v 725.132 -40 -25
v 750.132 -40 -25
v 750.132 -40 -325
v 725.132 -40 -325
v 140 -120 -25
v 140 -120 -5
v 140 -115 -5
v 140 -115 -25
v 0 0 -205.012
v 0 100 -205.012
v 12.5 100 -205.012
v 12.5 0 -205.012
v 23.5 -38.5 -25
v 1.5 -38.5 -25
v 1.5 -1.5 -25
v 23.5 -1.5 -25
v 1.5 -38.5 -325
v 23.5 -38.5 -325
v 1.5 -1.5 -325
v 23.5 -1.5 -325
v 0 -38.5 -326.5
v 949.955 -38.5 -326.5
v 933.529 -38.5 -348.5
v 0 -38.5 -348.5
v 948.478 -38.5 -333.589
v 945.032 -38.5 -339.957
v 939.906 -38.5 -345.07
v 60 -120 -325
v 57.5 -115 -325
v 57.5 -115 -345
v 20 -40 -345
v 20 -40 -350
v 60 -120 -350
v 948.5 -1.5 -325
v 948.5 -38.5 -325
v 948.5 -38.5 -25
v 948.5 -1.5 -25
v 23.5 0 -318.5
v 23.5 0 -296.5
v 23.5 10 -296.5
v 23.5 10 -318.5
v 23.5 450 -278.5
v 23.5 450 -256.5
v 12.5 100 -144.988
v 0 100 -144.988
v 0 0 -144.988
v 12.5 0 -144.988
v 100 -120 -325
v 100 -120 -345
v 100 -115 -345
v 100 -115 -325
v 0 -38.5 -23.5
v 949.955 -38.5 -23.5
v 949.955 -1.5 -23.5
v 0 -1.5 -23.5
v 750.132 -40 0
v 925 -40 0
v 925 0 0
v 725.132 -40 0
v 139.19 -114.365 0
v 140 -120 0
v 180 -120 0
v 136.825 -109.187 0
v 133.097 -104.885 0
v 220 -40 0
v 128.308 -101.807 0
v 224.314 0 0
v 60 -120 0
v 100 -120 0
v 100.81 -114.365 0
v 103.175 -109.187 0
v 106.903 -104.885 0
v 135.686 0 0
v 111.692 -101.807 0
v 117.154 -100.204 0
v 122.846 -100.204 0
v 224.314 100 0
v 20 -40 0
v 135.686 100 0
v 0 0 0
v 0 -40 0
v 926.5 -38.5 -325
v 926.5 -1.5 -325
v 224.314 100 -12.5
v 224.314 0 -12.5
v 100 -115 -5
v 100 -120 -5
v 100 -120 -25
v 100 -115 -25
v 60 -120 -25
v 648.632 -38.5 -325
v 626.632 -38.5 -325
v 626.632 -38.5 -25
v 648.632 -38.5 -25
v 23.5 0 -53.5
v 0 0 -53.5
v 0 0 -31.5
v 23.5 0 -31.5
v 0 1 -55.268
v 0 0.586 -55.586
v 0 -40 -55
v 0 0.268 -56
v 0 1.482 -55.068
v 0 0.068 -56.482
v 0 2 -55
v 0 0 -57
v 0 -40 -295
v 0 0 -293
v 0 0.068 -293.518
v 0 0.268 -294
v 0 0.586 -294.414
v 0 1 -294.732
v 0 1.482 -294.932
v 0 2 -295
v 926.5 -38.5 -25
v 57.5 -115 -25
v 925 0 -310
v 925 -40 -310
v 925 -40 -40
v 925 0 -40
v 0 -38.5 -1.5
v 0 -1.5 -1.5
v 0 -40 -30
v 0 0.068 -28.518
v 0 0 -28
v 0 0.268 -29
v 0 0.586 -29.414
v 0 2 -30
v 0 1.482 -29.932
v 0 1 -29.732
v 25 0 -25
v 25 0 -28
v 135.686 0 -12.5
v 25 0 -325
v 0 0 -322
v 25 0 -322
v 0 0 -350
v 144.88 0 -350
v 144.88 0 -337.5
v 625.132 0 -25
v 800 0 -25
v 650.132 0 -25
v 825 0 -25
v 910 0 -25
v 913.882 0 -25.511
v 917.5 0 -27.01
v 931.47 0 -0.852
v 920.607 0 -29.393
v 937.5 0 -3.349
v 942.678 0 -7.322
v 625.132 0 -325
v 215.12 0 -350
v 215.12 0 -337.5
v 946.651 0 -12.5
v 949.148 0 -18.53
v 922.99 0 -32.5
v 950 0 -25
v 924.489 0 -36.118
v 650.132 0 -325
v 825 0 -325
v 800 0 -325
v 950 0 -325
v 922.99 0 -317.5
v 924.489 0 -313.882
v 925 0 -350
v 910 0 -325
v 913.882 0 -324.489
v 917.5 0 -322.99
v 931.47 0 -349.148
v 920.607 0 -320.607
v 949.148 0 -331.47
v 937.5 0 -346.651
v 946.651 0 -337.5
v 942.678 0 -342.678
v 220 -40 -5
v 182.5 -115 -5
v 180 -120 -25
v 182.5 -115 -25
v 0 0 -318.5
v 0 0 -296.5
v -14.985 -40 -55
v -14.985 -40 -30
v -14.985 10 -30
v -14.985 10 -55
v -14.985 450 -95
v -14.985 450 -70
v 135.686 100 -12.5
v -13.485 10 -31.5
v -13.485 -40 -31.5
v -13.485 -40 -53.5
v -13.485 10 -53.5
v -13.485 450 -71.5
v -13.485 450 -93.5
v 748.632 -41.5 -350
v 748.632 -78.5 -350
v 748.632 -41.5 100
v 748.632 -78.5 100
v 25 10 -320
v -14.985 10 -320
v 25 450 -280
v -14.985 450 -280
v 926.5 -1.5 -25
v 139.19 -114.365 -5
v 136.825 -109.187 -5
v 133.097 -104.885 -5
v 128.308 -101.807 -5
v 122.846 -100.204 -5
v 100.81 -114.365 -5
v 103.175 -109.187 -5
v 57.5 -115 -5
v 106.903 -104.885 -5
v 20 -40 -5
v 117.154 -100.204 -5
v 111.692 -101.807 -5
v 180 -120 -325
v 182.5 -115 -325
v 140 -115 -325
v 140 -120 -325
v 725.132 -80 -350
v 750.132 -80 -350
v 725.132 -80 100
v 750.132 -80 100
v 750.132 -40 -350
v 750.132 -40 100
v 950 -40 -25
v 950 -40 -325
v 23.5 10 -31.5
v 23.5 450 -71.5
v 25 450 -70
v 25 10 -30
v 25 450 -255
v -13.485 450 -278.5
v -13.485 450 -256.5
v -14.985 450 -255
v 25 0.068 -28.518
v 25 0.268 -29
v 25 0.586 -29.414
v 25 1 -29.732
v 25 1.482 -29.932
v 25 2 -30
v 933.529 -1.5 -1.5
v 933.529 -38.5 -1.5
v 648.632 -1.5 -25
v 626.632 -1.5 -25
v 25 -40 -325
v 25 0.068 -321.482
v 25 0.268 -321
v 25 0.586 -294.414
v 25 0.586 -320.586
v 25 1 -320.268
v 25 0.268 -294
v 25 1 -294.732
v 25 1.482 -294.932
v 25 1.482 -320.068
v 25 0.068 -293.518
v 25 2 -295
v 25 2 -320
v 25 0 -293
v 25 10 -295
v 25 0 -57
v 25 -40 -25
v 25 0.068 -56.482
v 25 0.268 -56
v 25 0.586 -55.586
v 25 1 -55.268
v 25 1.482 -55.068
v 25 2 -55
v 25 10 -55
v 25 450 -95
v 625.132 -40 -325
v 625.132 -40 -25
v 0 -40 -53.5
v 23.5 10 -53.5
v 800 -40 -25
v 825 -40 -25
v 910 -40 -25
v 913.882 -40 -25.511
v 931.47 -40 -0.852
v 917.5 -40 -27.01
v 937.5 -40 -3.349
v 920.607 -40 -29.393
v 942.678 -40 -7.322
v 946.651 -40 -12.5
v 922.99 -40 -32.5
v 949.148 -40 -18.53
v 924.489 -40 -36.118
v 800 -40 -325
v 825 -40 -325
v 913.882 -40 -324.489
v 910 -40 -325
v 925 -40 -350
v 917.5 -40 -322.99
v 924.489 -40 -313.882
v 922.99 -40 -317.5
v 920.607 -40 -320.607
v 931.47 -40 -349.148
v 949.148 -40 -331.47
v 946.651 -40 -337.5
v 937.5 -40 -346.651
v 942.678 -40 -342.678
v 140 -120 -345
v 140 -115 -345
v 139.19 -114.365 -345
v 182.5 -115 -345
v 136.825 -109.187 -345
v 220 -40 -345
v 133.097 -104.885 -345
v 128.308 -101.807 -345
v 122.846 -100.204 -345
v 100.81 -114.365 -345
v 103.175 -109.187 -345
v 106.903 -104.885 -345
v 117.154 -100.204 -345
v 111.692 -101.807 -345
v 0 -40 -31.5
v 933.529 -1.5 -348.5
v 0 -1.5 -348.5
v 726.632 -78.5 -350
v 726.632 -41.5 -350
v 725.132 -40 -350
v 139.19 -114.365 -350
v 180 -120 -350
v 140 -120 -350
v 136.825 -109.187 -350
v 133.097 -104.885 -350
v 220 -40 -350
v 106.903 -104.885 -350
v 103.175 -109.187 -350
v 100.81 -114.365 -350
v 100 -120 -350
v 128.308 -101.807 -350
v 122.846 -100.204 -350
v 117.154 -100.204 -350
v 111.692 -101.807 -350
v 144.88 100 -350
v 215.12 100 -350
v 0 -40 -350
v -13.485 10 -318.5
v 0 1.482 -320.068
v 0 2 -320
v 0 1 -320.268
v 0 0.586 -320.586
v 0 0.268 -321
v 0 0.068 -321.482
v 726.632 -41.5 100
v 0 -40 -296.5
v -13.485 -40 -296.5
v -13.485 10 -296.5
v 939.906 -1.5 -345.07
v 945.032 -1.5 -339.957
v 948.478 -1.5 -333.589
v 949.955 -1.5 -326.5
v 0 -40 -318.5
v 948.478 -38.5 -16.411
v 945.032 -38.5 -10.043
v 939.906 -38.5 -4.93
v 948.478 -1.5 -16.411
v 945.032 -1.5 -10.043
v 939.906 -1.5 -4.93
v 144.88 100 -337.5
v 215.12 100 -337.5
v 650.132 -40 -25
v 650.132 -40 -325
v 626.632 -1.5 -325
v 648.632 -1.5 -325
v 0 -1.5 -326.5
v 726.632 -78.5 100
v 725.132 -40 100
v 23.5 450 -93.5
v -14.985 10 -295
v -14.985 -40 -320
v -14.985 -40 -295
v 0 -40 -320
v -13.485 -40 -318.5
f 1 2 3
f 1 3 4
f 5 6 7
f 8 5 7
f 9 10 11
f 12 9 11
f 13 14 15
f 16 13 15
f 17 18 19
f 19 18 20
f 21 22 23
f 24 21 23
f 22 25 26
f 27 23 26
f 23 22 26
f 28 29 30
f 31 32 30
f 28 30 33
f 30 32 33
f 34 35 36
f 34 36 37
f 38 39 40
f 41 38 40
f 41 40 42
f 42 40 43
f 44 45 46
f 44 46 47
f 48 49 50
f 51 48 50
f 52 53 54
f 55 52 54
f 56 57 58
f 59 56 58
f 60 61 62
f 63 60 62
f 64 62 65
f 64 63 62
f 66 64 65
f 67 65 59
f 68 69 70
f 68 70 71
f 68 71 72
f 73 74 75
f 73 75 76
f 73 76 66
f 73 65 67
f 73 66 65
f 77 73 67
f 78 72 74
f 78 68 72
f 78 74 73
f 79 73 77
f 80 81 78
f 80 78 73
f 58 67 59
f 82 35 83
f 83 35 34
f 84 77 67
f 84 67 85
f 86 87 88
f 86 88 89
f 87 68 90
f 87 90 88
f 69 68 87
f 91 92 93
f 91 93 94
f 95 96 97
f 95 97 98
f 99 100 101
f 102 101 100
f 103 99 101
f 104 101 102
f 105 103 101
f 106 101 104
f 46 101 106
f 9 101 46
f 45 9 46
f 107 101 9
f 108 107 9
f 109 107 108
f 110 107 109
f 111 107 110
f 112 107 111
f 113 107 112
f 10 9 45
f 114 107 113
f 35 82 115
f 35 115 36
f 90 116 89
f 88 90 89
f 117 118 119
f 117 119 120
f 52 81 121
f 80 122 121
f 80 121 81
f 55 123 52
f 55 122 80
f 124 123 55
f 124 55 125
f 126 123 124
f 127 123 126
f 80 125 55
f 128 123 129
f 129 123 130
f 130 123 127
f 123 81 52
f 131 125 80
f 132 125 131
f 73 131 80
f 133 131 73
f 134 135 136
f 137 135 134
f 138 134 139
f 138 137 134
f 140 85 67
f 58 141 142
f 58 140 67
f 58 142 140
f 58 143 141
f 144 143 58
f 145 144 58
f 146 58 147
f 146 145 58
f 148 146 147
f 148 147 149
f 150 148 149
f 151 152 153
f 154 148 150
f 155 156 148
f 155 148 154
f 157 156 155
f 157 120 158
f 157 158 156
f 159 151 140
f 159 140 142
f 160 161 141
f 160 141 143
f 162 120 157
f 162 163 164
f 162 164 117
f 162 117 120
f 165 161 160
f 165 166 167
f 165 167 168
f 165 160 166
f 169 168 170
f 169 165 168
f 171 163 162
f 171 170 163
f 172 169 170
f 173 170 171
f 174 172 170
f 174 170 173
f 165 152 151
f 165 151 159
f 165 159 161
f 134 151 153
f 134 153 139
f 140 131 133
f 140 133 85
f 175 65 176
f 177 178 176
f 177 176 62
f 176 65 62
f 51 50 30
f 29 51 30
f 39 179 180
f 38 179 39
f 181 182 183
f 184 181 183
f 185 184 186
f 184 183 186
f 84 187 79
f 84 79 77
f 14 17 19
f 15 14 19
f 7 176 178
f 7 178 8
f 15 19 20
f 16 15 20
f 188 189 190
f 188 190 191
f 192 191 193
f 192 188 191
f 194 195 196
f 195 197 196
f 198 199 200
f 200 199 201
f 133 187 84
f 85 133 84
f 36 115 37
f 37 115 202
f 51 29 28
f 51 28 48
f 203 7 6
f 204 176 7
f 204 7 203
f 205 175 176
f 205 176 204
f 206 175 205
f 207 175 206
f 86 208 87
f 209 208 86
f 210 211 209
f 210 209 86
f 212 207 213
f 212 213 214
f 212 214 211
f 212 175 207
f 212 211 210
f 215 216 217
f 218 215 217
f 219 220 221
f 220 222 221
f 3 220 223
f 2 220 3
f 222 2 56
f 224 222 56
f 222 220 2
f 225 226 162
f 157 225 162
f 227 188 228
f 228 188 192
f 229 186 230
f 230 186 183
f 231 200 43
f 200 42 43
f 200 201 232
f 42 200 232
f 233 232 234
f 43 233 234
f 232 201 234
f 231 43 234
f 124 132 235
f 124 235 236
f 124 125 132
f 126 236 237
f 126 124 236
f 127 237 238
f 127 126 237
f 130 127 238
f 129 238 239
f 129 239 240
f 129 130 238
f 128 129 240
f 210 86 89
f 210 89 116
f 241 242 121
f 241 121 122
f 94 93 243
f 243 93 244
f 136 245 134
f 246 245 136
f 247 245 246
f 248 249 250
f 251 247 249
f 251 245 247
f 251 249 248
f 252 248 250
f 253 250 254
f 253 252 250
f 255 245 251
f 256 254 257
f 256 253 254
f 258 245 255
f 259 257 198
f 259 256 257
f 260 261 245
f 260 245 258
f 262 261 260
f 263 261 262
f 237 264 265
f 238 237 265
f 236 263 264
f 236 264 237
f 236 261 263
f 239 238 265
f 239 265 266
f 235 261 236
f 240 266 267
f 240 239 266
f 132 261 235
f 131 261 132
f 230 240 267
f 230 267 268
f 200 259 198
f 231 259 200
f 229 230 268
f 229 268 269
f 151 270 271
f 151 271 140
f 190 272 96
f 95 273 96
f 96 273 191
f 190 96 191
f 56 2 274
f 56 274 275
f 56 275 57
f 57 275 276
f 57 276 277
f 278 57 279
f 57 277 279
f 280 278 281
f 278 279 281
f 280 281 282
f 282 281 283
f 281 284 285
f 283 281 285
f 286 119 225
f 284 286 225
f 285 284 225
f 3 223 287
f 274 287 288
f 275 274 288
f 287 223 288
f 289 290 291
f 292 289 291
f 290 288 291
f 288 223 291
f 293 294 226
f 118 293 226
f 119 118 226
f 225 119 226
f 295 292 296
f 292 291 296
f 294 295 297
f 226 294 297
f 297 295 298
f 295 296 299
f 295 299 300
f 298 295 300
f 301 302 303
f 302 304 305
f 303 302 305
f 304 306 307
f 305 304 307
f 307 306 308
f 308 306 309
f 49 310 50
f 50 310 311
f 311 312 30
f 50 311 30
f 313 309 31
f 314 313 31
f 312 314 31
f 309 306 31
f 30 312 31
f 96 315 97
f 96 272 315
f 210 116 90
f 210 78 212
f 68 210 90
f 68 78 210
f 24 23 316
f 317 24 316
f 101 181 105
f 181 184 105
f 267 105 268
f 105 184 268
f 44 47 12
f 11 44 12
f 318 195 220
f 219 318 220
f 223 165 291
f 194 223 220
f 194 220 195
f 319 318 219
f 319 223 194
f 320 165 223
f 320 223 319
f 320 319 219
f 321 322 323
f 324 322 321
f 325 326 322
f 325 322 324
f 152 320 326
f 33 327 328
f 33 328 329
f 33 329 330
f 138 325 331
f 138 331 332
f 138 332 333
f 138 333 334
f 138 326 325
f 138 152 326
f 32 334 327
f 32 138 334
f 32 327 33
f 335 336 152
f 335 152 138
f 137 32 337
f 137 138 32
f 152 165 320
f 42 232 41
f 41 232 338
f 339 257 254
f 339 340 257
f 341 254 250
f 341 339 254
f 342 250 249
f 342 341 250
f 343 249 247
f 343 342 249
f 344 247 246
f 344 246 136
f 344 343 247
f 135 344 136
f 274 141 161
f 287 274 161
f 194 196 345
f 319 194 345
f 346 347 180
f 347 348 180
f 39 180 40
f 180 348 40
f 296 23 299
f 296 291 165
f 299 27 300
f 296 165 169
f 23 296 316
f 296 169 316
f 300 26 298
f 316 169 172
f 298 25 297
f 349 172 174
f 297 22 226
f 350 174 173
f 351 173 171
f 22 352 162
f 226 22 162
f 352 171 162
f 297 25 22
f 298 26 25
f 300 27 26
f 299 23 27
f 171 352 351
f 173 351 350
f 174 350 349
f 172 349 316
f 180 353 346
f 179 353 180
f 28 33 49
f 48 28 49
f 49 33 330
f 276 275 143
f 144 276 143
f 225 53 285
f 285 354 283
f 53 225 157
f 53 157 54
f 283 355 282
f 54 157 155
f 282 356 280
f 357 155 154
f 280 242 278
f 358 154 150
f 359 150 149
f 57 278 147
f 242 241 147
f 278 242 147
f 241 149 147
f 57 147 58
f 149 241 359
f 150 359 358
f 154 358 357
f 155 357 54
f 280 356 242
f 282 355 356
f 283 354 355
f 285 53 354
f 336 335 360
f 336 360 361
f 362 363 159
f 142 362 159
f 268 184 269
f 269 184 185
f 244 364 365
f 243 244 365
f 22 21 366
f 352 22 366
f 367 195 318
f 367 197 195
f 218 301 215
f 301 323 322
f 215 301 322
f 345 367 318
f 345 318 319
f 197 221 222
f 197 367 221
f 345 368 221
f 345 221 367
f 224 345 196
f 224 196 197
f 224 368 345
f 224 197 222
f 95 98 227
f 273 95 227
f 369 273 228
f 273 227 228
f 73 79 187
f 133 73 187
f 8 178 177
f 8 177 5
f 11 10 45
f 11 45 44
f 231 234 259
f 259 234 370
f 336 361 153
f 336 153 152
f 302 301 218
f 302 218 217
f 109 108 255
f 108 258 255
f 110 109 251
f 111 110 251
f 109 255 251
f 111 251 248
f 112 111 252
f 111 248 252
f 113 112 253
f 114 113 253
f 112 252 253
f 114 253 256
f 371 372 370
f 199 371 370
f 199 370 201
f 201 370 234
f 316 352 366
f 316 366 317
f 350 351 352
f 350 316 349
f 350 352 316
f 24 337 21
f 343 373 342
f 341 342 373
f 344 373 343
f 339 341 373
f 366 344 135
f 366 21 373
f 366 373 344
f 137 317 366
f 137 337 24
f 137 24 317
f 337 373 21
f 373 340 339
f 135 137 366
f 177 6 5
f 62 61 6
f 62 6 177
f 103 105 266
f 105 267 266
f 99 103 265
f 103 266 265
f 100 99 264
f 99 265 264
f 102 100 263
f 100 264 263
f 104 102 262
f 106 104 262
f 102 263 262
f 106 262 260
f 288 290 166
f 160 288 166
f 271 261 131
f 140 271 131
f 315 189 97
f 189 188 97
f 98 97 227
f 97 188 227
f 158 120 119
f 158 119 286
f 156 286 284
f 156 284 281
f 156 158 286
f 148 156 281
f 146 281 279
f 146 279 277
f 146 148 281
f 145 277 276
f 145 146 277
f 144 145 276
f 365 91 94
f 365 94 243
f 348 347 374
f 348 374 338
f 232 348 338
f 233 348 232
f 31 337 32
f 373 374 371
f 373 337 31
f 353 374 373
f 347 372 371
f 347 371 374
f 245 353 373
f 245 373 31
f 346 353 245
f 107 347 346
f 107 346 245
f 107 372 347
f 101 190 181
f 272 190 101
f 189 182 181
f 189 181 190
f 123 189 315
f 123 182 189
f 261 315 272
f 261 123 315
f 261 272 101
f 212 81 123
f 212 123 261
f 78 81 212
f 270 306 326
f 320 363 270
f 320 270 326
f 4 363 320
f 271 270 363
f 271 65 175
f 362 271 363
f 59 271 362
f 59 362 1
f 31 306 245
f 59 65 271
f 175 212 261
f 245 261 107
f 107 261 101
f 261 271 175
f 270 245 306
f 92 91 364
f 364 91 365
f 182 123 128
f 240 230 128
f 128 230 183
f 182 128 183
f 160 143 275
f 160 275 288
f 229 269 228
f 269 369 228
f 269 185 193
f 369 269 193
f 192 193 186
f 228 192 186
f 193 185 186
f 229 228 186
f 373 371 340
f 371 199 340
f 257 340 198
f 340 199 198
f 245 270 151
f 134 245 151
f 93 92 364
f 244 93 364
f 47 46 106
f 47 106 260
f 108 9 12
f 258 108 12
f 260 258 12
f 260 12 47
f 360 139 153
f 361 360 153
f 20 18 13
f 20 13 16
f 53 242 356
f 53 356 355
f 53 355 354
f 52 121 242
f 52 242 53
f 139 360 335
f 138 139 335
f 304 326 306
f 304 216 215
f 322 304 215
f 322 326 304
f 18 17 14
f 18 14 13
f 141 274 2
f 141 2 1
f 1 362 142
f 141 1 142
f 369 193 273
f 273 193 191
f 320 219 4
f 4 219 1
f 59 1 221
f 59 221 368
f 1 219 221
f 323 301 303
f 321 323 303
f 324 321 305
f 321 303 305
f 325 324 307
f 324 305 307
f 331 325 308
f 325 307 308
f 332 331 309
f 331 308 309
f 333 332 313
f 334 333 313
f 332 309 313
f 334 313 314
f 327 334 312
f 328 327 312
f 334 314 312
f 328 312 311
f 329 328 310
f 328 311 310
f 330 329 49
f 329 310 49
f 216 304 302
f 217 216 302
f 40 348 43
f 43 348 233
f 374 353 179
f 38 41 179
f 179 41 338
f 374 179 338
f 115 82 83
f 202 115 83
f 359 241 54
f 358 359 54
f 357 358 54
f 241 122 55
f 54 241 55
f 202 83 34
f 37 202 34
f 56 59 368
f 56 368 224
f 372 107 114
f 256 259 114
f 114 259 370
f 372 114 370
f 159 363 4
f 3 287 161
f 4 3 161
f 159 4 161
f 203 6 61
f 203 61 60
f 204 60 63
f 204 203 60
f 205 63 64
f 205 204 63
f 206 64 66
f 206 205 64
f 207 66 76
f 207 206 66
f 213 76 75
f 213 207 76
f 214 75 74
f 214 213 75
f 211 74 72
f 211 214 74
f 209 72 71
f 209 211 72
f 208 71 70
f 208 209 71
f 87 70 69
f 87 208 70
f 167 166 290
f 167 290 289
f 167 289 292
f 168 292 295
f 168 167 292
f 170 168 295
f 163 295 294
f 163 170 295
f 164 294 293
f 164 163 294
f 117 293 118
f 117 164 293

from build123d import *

# Parameters (mm, degrees)
SKETCH1_W            = 25
SKETCH1_H            = 40
SKETCH1_W_2          = 22
SKETCH1_H_2          = 37
BOSS_EXTRUDE1_DEPTH  = 950
SKETCH3_W            = 25
SKETCH3_H            = 40
SKETCH3_W_2          = 22
SKETCH3_H_2          = 37
BOSS_EXTRUDE2_DEPTH  = 950
SKETCH4_W            = 25
SKETCH4_H            = 40
SKETCH4_W_2          = 22
SKETCH4_H_2          = 37
BOSS_EXTRUDE3_DEPTH  = 300
SKETCH5_W            = 25
SKETCH5_H            = 40
SKETCH5_W_2          = 22
SKETCH5_H_2          = 37
BOSS_EXTRUDE4_DEPTH  = 300
CUT_EXTRUDE1_DEPTH   = 300
CUT_EXTRUDE2_DEPTH   = 300
BOSS_EXTRUDE5_DEPTH  = 40
BOSS_EXTRUDE6_DEPTH  = 40
SKETCH10_W           = 25
SKETCH10_H           = 300
BOSS_EXTRUDE7_DEPTH  = 40
SKETCH12_W           = 25
SKETCH12_H           = 40
SKETCH12_W_2         = 22
SKETCH12_H_2         = 37
BOSS_EXTRUDE8_DEPTH  = 100
SKETCH14_W           = 25
SKETCH14_H           = 40
SKETCH14_W_2         = 22
SKETCH14_H_2         = 37
BOSS_EXTRUDE9_DEPTH  = 350
SKETCH15_W           = 25
SKETCH15_H           = 40
SKETCH15_W_2         = 22
SKETCH15_H_2         = 37
BOSS_EXTRUDE10_DEPTH = 300
BOSS_EXTRUDE11_DEPTH = 5
BOSS_EXTRUDE12_DEPTH = 20
SKETCH19_R           = 20
CUT_EXTRUDE3_DEPTH   = 20
SKETCH21_W           = 12.5
SKETCH21_H           = 60.024303072
SKETCH21_W_2         = 70.240967534
SKETCH21_H_2         = 12.5
SKETCH21_W_3         = 88.627521068
BOSS_EXTRUDE13_DEPTH = 100
BOSS_EXTRUDE14_DEPTH = 10
FILLET1_R            = 2
FILLET2_R            = 2
FILLET3_R            = 2
FILLET4_R            = 2
BOSS_EXTRUDE15_DEPTH = 40
BOSS_EXTRUDE16_DEPTH = 40
SWEEP1_START         = -14.984844988
SWEEP1_DEPTH         = 39.984844988
SWEEP1_2_DEPTH       = 1.5
SWEEP1_START_2       = 23.5
SWEEP1_3_DEPTH       = 1.5
SWEEP2_START         = -14.984844988
SWEEP2_DEPTH         = 39.984844988
SWEEP2_2_DEPTH       = 1.5
SWEEP2_START_2       = 23.5
SWEEP2_3_DEPTH       = 1.5


# Read off the part's stored shape, not the designer's step: Sweep1, Sweep2
with BuildPart() as part:
    # Sketch1 → Boss-Extrude1 (new body)
    with BuildSketch(Plane(origin=(0, 0, 0), x_dir=(0, 0, -1), z_dir=(1, 0, 0))):
        with Locations((12.5, -20)):
            Rectangle(SKETCH1_W, SKETCH1_H)
        with Locations((12.5, -20)):
            Rectangle(SKETCH1_W_2, SKETCH1_H_2, mode=Mode.SUBTRACT)
    extrude(amount=BOSS_EXTRUDE1_DEPTH)



with BuildPart() as body_2:
    # Sketch3 → Boss-Extrude2 (new body)
    with BuildSketch(Plane(origin=(950, 0, 0), x_dir=(0, 0, -1), z_dir=(1, 0, 0))):
        with Locations((337.5, -20)):
            Rectangle(SKETCH3_W, SKETCH3_H)
        with Locations((337.5, -20)):
            Rectangle(SKETCH3_W_2, SKETCH3_H_2, mode=Mode.SUBTRACT)
    extrude(amount=-BOSS_EXTRUDE2_DEPTH)


with BuildPart() as part_1:
    add(part.part)

    add(body_2.part)  # Boss-Extrude3 merges body 2
    # Sketch4 → Boss-Extrude3 (add)
    with BuildSketch(Plane.XY.offset(-325)):
        with Locations((937.5, -20)):
            Rectangle(SKETCH4_W, SKETCH4_H)
        with Locations((937.5, -20)):
            Rectangle(SKETCH4_W_2, SKETCH4_H_2, mode=Mode.SUBTRACT)
    extrude(amount=BOSS_EXTRUDE3_DEPTH)

    # Sketch5 → Boss-Extrude4 (add)
    with BuildSketch(Plane.XY.offset(-325)):
        with Locations((12.5, -20)):
            Rectangle(SKETCH5_W, SKETCH5_H)
        with Locations((12.5, -20)):
            Rectangle(SKETCH5_W_2, SKETCH5_H_2, mode=Mode.SUBTRACT)
    extrude(amount=BOSS_EXTRUDE4_DEPTH)

    # Sketch6 → Cut-Extrude1 (cut)
    with BuildSketch(Plane(origin=(0, 0, 0), x_dir=(1, 0, 0), z_dir=(0, 1, 0))):
        with BuildLine():
            Line((925, 0), (950, 0))
            Line((950, 0), (950, 25))
            ThreePointArc((950, 25), (942.67766953, 7.32233047), (925, 0))
        make_face()
    extrude(amount=-CUT_EXTRUDE1_DEPTH, mode=Mode.SUBTRACT)

    # Sketch7 → Cut-Extrude2 (cut)
    with BuildSketch(Plane(origin=(0, 0, 0), x_dir=(1, 0, 0), z_dir=(0, 1, 0))):
        with BuildLine():
            Line((950, 325), (950, 350))
            Line((950, 350), (925, 350))
            ThreePointArc((925, 350), (942.67766953, 342.67766953), (950, 325))
        make_face()
    extrude(amount=-CUT_EXTRUDE2_DEPTH, mode=Mode.SUBTRACT)

    # Sketch8 → Boss-Extrude5 (add)
    with BuildSketch(Plane(origin=(0, 0, 0), x_dir=(1, 0, 0), z_dir=(0, 1, 0))):
        with BuildLine():
            Line((910, 25), (925, 25))
            Line((925, 25), (925, 40))
            ThreePointArc((925, 40), (920.606601718, 29.393398282), (910, 25))
        make_face()
    extrude(amount=-BOSS_EXTRUDE5_DEPTH)

    # Sketch9 → Boss-Extrude6 (add)
    with BuildSketch(Plane(origin=(0, 0, 0), x_dir=(1, 0, 0), z_dir=(0, 1, 0))):
        with BuildLine():
            Line((925, 310), (925, 325))
            Line((925, 325), (910, 325))
            ThreePointArc((910, 325), (920.606601718, 320.606601718), (925, 310))
        make_face()
    extrude(amount=-BOSS_EXTRUDE6_DEPTH)

    # Sketch10 → Boss-Extrude7 (add)
    with BuildSketch(Plane(origin=(0, 0, 0), x_dir=(1, 0, 0), z_dir=(0, 1, 0))):
        with Locations((812.5, 175)):
            Rectangle(SKETCH10_W, SKETCH10_H)
    extrude(amount=-BOSS_EXTRUDE7_DEPTH)



with BuildPart() as body_2_2:
    # Sketch12 → Boss-Extrude8 (new body)
    with BuildSketch(Plane.XY):
        with Locations((737.631643114, -60)):
            Rectangle(SKETCH12_W, SKETCH12_H)
        with Locations((737.631643114, -60)):
            Rectangle(SKETCH12_W_2, SKETCH12_H_2, mode=Mode.SUBTRACT)
    extrude(amount=BOSS_EXTRUDE8_DEPTH)


with BuildPart() as part_2:
    add(part_1.part)

    add(body_2_2.part)  # Boss-Extrude9 merges body 2 2
    # Sketch14 → Boss-Extrude9 (add)
    with BuildSketch(Plane(origin=(0, 0, 0), x_dir=(-1, 0, 0), z_dir=(0, 0, -1))):
        with Locations((-737.631643114, -60)):
            Rectangle(SKETCH14_W, SKETCH14_H)
        with Locations((-737.631643114, -60)):
            Rectangle(SKETCH14_W_2, SKETCH14_H_2, mode=Mode.SUBTRACT)
    extrude(amount=BOSS_EXTRUDE9_DEPTH)

    # Sketch15 → Boss-Extrude10 (add)
    with BuildSketch(Plane.XY.offset(-325)):
        with Locations((637.631643114, -20)):
            Rectangle(SKETCH15_W, SKETCH15_H)
        with Locations((637.631643114, -20)):
            Rectangle(SKETCH15_W_2, SKETCH15_H_2, mode=Mode.SUBTRACT)
    extrude(amount=BOSS_EXTRUDE10_DEPTH)

    # Sketch16 → Boss-Extrude11 (add)
    with BuildSketch(Plane(origin=(0, 0, -350), x_dir=(-1, 0, 0), z_dir=(0, 0, -1))):
        Polygon((-20, -40), (-220, -40), (-180, -120), (-60, -120), align=None)
    boss_extrude11 = extrude(amount=-BOSS_EXTRUDE11_DEPTH)

    # Mirror1: Boss-Extrude11 across plane
    add(boss_extrude11.mirror(Plane.XY.offset(-175)))

    # Sketch18 → Boss-Extrude12 (add)
    with BuildSketch(Plane.XY.offset(-345)):
        Polygon((60, -115), (57.5, -115), (60, -120), (100, -120), (100, -115), align=None)
        Polygon((180, -115), (182.5, -115), (180, -120), (140, -120), (140, -115), align=None)
    boss_extrude12 = extrude(amount=BOSS_EXTRUDE12_DEPTH)

    # Sketch19 → Cut-Extrude3 (cut)
    with BuildSketch(Plane.XY.offset(-345)):
        with Locations((120, -120)):
            Circle(SKETCH19_R)
    cut_extrude3 = extrude(amount=-CUT_EXTRUDE3_DEPTH, mode=Mode.SUBTRACT)

    # Mirror2: Boss-Extrude12, Cut-Extrude3 across plane
    add(boss_extrude12.mirror(Plane.XY.offset(-175)))
    add(cut_extrude3.mirror(Plane.XY.offset(-175)), mode=Mode.SUBTRACT)

    # Sketch21 → Boss-Extrude13 (add)
    with BuildSketch(Plane(origin=(0, 0, 0), x_dir=(1, 0, 0), z_dir=(0, 1, 0))):
        with Locations((6.25, 175)):
            Rectangle(SKETCH21_W, SKETCH21_H)
        with Locations((180, 343.75)):
            Rectangle(SKETCH21_W_2, SKETCH21_H_2)
        with Locations((180, 6.25)):
            Rectangle(SKETCH21_W_3, SKETCH21_H_2)
    extrude(amount=BOSS_EXTRUDE13_DEPTH)

    # Sketch22 → Boss-Extrude14 (add)
    with BuildSketch(Plane(origin=(0, 0, 0), x_dir=(1, 0, 0), z_dir=(0, 1, 0))):
        Polygon((0, 320), (25, 320), (25, 295), (0, 295), (-14.984844988, 295), (-14.984844988, 320), align=None)
        Polygon((0, 318.5), (-13.484844988, 318.5), (-13.484844988, 296.5), (0, 296.5), (23.5, 296.5), (23.5, 318.5), align=None, mode=Mode.SUBTRACT)
    boss_extrude14 = extrude(amount=BOSS_EXTRUDE14_DEPTH)

    # Mirror3: Boss-Extrude14 across plane
    add(boss_extrude14.mirror(Plane.XY.offset(-175)))

    # Fillet1
    fillet1_edges = [part_2.edges().sort_by_distance(p)[0] for p in [
        (12.5, 0, -55),
    ]]
    fillet(fillet1_edges, radius=FILLET1_R)

    # Fillet2
    fillet2_edges = [part_2.edges().sort_by_distance(p)[0] for p in [
        (12.5, 0, -295),
    ]]
    fillet(fillet2_edges, radius=FILLET2_R)

    # Fillet3
    fillet3_edges = [part_2.edges().sort_by_distance(p)[0] for p in [
        (12.5, 0, -320),
    ]]
    fillet(fillet3_edges, radius=FILLET3_R)

    # Fillet4
    fillet4_edges = [part_2.edges().sort_by_distance(p)[0] for p in [
        (12.5, 0, -30),
    ]]
    fillet(fillet4_edges, radius=FILLET4_R)

    # Sketch23 → Boss-Extrude15 (add)
    with BuildSketch(Plane.XZ):
        Polygon((0, -31.5), (0, -30), (-14.984844988, -30), (-14.984844988, -55), (0, -55), (0, -53.5), (-13.484844988, -53.5), (-13.484844988, -31.5), align=None)
    extrude(amount=BOSS_EXTRUDE15_DEPTH)

    # Sketch24 → Boss-Extrude16 (add)
    with BuildSketch(Plane.XZ):
        Polygon((0, -296.5), (0, -295), (-14.984844988, -295), (-14.984844988, -320), (0, -320), (0, -318.5), (-13.484844988, -318.5), (-13.484844988, -296.5), align=None)
    extrude(amount=BOSS_EXTRUDE16_DEPTH)

    # Sweep1 outline → Sweep1 (add)
    with BuildSketch(Plane.YZ.offset(SWEEP1_START)):
        Polygon((10, -318.5), (10, -320), (450, -280), (450, -278.5), align=None)
        Polygon((10, -295), (10, -296.5), (450, -256.5), (450, -255), align=None)
    extrude(amount=SWEEP1_DEPTH)

    # Sweep1 2 outline → Sweep1 2 (add)
    with BuildSketch(Plane.YZ.offset(SWEEP1_START)):
        Polygon((10, -296.5), (10, -318.5), (450, -278.5), (450, -256.5), align=None)
    extrude(amount=SWEEP1_2_DEPTH)

    # Sweep1 3 outline → Sweep1 3 (add)
    with BuildSketch(Plane.YZ.offset(SWEEP1_START_2)):
        Polygon((10, -296.5), (10, -318.5), (450, -278.5), (450, -256.5), align=None)
    extrude(amount=SWEEP1_3_DEPTH)

    # Sweep2 outline → Sweep2 (add)
    with BuildSketch(Plane.YZ.offset(SWEEP2_START)):
        Polygon((10, -55), (450, -95), (450, -93.5), (10, -53.5), align=None)
        Polygon((10, -31.5), (450, -71.5), (450, -70), (10, -30), align=None)
    extrude(amount=SWEEP2_DEPTH)

    # Sweep2 2 outline → Sweep2 2 (add)
    with BuildSketch(Plane.YZ.offset(SWEEP2_START)):
        Polygon((10, -53.5), (450, -93.5), (450, -71.5), (10, -31.5), align=None)
    extrude(amount=SWEEP2_2_DEPTH)

    # Sweep2 3 outline → Sweep2 3 (add)
    with BuildSketch(Plane.YZ.offset(SWEEP2_START_2)):
        Polygon((10, -53.5), (450, -93.5), (450, -71.5), (10, -31.5), align=None)
    extrude(amount=SWEEP2_3_DEPTH)


solid = part_2.part
